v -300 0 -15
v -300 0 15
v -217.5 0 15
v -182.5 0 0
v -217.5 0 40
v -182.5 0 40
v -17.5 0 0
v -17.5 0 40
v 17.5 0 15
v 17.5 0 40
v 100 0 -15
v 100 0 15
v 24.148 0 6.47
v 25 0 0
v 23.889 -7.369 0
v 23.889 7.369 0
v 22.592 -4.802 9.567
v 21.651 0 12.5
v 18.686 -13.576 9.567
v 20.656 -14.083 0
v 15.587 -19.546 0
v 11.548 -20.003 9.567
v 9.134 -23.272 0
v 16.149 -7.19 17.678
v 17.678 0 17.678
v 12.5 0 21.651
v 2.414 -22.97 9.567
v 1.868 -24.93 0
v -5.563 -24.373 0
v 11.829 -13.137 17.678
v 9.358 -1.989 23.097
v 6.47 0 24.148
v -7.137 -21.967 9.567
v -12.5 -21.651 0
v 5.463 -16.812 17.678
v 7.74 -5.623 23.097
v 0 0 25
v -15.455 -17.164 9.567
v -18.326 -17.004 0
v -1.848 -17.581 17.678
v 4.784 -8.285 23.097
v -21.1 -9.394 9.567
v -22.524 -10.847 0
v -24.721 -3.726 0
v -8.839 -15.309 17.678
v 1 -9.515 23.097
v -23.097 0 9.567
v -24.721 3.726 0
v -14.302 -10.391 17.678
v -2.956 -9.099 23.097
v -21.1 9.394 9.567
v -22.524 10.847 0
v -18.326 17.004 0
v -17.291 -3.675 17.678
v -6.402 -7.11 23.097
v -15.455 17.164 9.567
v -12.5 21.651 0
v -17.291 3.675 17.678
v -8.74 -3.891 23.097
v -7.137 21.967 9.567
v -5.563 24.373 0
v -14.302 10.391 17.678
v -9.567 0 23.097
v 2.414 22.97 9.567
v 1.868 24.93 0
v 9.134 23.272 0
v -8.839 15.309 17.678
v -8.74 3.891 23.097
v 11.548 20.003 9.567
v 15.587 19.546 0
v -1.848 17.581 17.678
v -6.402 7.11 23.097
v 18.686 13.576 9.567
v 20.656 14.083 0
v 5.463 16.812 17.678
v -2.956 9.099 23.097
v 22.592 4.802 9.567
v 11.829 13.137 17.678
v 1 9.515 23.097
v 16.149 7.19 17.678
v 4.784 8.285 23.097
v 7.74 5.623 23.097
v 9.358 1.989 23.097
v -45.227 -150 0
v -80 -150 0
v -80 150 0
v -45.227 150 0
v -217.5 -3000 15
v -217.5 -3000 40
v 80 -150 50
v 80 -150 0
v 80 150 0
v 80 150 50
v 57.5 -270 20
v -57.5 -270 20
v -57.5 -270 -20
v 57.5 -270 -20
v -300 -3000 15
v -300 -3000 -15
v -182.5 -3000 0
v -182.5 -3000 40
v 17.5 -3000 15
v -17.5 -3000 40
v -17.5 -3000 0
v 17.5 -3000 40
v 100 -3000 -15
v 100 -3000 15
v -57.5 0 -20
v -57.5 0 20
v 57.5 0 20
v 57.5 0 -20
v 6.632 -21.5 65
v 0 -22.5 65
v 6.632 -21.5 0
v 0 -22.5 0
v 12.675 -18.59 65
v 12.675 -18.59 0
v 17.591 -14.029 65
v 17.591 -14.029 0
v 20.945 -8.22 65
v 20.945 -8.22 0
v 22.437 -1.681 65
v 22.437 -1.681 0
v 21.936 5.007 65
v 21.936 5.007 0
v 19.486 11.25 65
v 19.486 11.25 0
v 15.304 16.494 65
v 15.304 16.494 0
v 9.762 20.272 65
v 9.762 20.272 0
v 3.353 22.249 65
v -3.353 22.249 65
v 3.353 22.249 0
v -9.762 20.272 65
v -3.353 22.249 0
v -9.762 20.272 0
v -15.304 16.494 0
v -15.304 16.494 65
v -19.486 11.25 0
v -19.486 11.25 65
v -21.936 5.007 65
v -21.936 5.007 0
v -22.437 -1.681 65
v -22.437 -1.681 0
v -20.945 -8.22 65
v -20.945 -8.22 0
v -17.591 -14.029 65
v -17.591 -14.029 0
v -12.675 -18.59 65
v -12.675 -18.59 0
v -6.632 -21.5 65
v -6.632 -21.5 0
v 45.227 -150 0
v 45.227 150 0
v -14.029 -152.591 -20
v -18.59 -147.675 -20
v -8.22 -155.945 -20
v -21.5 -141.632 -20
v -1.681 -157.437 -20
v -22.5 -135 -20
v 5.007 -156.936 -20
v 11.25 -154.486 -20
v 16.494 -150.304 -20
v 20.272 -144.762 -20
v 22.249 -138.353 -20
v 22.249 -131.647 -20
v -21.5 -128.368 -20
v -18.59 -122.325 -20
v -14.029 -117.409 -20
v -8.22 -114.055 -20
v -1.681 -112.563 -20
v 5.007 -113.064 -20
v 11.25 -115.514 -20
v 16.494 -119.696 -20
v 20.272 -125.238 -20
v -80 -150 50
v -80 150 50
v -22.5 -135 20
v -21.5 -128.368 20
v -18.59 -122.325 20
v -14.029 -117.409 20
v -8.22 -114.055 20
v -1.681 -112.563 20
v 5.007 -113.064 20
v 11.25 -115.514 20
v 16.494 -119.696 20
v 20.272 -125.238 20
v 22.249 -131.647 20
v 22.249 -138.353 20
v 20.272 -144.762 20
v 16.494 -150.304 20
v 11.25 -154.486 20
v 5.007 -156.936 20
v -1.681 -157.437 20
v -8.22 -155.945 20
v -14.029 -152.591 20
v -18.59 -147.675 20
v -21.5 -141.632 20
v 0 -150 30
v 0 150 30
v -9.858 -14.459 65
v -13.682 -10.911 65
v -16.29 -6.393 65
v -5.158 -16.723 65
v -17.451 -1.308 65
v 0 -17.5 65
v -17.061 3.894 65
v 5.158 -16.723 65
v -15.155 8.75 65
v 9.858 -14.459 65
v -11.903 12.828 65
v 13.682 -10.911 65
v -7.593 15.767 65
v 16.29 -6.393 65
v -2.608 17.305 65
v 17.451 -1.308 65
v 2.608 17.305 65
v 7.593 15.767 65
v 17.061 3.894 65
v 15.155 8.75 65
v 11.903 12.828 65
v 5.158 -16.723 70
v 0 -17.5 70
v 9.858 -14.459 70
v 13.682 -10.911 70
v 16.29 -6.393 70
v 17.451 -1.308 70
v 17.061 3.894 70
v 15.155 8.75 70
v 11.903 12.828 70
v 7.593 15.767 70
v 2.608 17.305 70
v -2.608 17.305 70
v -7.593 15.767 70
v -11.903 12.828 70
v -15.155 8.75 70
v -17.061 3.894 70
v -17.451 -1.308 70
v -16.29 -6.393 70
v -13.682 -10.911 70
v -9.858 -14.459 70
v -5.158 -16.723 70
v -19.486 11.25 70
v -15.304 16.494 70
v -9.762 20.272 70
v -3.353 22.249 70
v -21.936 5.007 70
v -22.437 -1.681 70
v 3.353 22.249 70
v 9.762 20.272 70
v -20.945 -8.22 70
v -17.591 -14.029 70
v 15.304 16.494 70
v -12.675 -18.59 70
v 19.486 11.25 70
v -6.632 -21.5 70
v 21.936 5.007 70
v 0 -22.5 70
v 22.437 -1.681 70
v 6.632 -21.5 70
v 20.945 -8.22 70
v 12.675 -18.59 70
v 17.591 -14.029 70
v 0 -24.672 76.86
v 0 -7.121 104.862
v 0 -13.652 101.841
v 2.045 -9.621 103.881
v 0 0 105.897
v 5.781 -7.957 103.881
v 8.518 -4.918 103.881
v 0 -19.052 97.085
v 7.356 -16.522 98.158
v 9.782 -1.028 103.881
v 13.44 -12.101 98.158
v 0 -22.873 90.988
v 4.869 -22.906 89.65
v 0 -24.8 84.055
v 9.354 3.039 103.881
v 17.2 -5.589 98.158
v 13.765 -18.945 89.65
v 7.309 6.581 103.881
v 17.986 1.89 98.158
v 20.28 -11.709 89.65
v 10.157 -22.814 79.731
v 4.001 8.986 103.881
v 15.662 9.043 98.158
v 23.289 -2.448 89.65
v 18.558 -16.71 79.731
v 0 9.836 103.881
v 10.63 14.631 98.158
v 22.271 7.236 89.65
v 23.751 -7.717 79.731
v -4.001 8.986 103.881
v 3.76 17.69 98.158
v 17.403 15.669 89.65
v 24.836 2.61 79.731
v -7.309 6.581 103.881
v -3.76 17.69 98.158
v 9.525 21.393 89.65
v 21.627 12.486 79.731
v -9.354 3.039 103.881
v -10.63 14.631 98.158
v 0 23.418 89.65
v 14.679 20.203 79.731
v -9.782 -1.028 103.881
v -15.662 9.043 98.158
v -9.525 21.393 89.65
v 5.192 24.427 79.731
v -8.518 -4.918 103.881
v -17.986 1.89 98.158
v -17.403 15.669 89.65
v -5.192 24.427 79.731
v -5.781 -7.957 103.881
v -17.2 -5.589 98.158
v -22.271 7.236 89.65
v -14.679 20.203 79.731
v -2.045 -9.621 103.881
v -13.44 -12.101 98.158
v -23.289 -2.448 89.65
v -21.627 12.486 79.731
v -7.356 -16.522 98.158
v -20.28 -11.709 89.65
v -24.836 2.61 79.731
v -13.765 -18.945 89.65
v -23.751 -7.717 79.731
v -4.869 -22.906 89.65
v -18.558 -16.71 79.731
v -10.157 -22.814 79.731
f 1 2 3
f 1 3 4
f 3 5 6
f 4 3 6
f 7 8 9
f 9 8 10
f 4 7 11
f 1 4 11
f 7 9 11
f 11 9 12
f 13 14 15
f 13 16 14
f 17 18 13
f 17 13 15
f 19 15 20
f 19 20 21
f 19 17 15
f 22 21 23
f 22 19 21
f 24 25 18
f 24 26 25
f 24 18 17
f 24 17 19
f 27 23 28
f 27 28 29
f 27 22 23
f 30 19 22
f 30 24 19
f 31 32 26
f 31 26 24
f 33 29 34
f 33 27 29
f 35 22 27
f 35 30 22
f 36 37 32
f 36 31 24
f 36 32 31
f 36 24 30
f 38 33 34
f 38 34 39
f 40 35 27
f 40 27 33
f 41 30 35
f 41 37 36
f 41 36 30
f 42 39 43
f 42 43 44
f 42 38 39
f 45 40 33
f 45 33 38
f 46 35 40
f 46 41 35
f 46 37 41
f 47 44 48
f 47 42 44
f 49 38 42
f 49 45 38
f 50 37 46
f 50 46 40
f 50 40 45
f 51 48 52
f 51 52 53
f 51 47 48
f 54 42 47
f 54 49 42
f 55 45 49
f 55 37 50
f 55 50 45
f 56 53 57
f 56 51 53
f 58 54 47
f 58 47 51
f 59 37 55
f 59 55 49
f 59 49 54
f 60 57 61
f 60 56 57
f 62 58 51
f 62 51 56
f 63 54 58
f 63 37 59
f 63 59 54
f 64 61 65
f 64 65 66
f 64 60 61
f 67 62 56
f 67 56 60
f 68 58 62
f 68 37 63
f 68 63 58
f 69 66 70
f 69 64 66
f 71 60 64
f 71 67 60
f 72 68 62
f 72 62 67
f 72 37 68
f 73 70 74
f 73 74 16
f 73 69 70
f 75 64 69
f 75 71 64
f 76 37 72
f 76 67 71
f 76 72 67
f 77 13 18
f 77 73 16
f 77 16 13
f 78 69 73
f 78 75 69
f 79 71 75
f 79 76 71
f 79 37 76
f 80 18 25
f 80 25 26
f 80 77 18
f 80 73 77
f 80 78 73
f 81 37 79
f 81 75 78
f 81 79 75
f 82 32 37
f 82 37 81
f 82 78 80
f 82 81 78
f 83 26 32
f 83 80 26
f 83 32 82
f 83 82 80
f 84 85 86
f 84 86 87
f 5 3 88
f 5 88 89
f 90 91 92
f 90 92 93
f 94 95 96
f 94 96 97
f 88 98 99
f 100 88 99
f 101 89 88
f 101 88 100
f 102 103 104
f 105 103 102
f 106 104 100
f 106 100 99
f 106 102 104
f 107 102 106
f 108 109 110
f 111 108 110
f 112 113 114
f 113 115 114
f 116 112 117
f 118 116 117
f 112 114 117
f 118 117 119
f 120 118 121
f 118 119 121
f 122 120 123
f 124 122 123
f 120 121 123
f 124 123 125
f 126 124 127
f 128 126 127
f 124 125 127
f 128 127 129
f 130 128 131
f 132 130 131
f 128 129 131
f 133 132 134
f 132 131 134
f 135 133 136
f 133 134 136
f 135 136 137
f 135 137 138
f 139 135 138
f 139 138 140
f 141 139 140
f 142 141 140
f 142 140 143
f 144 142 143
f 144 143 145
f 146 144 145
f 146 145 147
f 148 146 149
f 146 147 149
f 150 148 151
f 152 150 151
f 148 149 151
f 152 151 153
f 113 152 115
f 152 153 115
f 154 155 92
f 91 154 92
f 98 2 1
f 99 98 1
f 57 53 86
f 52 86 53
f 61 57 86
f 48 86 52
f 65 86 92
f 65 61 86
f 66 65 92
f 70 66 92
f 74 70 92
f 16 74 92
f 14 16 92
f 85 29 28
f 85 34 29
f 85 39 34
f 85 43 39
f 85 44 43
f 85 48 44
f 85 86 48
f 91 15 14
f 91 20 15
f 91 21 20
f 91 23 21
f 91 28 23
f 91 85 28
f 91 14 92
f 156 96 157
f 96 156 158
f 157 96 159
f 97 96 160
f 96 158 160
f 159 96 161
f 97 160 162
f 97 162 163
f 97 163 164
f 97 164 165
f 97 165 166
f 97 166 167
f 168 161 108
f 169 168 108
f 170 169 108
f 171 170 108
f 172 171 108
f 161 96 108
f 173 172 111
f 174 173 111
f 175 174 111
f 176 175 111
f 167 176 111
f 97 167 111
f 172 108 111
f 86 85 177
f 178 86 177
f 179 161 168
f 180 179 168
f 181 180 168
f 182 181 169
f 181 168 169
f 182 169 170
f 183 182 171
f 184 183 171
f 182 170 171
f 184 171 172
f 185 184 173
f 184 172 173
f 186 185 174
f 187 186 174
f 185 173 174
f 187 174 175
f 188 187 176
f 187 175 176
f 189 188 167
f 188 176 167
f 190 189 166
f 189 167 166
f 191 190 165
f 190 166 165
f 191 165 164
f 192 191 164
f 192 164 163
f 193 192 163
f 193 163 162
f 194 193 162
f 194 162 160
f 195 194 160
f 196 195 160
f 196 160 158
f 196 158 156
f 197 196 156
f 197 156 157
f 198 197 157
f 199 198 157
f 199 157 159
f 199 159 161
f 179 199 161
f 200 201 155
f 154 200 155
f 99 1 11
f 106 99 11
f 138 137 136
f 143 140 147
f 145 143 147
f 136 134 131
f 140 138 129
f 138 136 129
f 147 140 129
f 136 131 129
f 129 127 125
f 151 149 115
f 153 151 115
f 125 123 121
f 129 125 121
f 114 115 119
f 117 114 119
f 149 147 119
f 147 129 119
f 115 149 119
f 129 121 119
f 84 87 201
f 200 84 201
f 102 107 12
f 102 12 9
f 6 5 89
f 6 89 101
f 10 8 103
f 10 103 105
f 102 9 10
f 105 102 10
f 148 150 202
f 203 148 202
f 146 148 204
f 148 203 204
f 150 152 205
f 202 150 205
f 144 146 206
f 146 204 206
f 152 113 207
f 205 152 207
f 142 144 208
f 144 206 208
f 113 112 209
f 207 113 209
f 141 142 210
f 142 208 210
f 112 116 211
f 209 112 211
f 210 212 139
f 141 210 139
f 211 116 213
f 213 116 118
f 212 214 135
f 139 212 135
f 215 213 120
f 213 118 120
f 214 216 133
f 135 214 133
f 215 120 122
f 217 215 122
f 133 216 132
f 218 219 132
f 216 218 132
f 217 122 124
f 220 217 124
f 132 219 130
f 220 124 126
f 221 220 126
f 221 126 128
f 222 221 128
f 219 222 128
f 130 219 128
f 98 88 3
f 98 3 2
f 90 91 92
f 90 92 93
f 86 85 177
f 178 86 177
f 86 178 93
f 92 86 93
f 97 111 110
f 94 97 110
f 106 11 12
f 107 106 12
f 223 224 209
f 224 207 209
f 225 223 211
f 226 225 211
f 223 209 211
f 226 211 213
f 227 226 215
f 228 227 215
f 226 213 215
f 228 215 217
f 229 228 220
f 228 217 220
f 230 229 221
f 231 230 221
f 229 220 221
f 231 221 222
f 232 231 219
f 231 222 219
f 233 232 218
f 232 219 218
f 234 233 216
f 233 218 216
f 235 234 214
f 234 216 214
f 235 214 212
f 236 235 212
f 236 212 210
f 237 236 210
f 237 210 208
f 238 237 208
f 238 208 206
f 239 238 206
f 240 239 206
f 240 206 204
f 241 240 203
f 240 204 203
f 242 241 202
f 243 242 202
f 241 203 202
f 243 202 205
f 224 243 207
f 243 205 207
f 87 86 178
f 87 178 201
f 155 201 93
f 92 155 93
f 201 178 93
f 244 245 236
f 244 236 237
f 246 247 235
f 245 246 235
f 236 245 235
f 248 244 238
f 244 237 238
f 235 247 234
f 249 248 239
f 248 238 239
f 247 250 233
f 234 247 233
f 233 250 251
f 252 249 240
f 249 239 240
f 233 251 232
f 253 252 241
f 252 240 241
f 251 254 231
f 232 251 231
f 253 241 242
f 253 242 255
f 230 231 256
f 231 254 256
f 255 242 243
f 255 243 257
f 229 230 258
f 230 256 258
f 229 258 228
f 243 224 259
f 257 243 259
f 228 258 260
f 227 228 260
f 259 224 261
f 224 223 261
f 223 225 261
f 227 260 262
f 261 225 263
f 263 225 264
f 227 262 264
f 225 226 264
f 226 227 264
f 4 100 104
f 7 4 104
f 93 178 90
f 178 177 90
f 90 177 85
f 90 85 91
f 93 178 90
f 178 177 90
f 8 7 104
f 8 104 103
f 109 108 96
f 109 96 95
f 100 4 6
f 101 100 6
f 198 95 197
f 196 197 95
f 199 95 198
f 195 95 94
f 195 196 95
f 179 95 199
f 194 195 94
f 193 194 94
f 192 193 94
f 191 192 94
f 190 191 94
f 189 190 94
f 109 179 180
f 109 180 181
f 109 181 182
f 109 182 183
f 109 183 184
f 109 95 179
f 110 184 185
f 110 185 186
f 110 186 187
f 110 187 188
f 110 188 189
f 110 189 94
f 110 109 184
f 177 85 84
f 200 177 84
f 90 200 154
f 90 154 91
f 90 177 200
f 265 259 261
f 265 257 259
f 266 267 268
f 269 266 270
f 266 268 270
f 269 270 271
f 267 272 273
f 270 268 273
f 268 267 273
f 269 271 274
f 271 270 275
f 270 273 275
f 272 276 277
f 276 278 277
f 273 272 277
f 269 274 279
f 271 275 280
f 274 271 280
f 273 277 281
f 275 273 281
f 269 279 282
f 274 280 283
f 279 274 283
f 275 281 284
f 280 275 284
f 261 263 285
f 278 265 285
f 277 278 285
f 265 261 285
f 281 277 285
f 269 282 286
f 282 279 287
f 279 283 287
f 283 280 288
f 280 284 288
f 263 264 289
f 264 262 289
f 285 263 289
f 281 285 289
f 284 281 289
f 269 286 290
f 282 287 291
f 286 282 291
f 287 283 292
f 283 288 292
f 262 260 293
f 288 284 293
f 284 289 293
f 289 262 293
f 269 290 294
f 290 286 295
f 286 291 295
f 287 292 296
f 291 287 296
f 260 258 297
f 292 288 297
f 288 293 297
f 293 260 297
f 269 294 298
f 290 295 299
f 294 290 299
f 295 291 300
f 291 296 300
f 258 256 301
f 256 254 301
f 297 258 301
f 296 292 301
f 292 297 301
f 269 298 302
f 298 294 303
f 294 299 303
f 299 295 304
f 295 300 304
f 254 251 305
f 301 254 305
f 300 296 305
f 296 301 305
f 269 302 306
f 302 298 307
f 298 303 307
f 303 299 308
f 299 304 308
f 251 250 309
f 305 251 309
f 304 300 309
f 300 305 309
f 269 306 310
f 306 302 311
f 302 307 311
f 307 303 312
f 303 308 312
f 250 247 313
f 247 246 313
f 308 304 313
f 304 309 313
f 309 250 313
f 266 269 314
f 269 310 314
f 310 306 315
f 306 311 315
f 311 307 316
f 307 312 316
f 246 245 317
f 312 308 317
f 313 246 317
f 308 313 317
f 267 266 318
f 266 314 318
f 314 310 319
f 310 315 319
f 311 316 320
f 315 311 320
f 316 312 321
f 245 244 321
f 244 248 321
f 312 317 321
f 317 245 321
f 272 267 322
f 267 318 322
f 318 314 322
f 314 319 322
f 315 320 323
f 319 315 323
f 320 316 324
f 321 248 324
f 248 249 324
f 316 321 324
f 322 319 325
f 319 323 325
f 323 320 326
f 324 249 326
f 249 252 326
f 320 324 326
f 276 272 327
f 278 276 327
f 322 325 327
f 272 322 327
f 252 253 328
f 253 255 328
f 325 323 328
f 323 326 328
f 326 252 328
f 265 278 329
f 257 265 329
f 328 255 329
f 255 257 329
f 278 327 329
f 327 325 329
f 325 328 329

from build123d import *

# Parameters (mm, degrees)
F0_W           = 35
F0_H           = 25
F1_DEPTH       = 3000
F2_W           = 165
F2_H           = 15
F3_DEPTH       = 3000.001
F4_W           = 115
F4_H           = 40
F5_DEPTH       = 270
F7_D           = 45
F10_W          = 160
F10_H          = 50
F11_DEPTH      = 150
F11_DEPTH_BACK = 150
F15_DEPTH      = 150
F15_DEPTH_BACK = 150
F17_DEPTH      = 3150.001


with BuildPart() as f1:
    # F0 (on Front) → F1 (new body)
    with BuildSketch(Plane.XZ):
        with Locations((0, 27.5)):
            Rectangle(F0_W, F0_H)
        Polygon((-100, -15), (100, -15), (100, 15), (17.5, 15), (-17.5, 15), (-100, 15), align=None)
        with Locations((-200, 27.5)):
            Rectangle(F0_W, F0_H)
        Polygon((-300, -15), (-100, -15), (-100, 15), (-182.5, 15), (-217.5, 15), (-300, 15), align=None)
    extrude(amount=F1_DEPTH)

    # F2 (on face) → F3 (cut, through all)
    with BuildSketch(Plane.XZ.offset(3000)):
        with Locations((-100, 7.5)):
            Rectangle(F2_W, F2_H)
    extrude(amount=-F3_DEPTH, mode=Mode.SUBTRACT)


with BuildPart() as f5:
    # F4 (on Front) → F5 (new body)
    with BuildSketch(Plane.XZ):
        Rectangle(F4_W, F4_H)
    extrude(amount=F5_DEPTH)

    # F7 (through all)
    with Locations(Plane.XY.offset(20)):
        with Locations((0, -135)):
            Hole(F7_D / 2)


with BuildPart() as f9:
    # F8 (on Right) → F9 (revolve)
    with BuildSketch(Plane.YZ):
        with BuildLine():
            Line((-22.5, 65), (-22.5, 0))
            Line((-22.5, 0), (0, 0))
            Line((0, 0), (0, 80.8972473589))
            Line((0, 80.8972473589), (0, 105.8972473589))
            ThreePointArc((0, 105.8972473589), (-21.1829080153, 94.1744612238), (-22.5, 70))
            Line((-22.5, 70), (-17.5, 70))
            Line((-17.5, 70), (-17.5, 65))
            Line((-17.5, 65), (-22.5, 65))
        make_face()
    revolve(axis=Axis((0, 0, 40.4486236794), (0, 0, 1)))


with BuildPart() as f11:
    # F10 (on Front) → F11 (new body, two sides)
    with BuildSketch(Plane.XZ) as f11_sk:
        with Locations((0, 25)):
            Rectangle(F10_W, F10_H)
    extrude(amount=F11_DEPTH)
    extrude(f11_sk.sketch, amount=-F11_DEPTH_BACK)


with BuildPart() as f13:
    # F12 (on Front) → F13 (revolve)
    with BuildSketch(Plane.XZ):
        with BuildLine():
            Line((0, 0), (25, 0))
            ThreePointArc((25, 0), (17.6776695297, 17.6776695297), (0, 25))
            Line((0, 25), (0, 0))
        make_face()
    revolve(axis=Axis((0, 0, 12.5), (0, 0, -1)))


with BuildPart() as f11_1:
    add(f11.part)

    # F14: cut F13
    add(f13.part, mode=Mode.SUBTRACT)


with BuildPart() as f15:
    # F10 (on Front) → F15 (new body, two sides)
    with BuildSketch(Plane.XZ) as f15_sk:
        with Locations((0, 25)):
            Rectangle(F10_W, F10_H)
    extrude(amount=F15_DEPTH)
    extrude(f15_sk.sketch, amount=-F15_DEPTH_BACK)

    # F16 (on face) → F17 (cut, through all)
    with BuildSketch(Plane(origin=(0, 150, 0), x_dir=(-1, 0, 0), z_dir=(0, 1, 0))):
        Polygon((0, 30), (-45.2267016867, 0), (45.2267016867, 0), align=None)
    extrude(amount=-F17_DEPTH, mode=Mode.SUBTRACT)


solid = Compound([f1.part, f5.part, f9.part, f11_1.part, f15.part])
